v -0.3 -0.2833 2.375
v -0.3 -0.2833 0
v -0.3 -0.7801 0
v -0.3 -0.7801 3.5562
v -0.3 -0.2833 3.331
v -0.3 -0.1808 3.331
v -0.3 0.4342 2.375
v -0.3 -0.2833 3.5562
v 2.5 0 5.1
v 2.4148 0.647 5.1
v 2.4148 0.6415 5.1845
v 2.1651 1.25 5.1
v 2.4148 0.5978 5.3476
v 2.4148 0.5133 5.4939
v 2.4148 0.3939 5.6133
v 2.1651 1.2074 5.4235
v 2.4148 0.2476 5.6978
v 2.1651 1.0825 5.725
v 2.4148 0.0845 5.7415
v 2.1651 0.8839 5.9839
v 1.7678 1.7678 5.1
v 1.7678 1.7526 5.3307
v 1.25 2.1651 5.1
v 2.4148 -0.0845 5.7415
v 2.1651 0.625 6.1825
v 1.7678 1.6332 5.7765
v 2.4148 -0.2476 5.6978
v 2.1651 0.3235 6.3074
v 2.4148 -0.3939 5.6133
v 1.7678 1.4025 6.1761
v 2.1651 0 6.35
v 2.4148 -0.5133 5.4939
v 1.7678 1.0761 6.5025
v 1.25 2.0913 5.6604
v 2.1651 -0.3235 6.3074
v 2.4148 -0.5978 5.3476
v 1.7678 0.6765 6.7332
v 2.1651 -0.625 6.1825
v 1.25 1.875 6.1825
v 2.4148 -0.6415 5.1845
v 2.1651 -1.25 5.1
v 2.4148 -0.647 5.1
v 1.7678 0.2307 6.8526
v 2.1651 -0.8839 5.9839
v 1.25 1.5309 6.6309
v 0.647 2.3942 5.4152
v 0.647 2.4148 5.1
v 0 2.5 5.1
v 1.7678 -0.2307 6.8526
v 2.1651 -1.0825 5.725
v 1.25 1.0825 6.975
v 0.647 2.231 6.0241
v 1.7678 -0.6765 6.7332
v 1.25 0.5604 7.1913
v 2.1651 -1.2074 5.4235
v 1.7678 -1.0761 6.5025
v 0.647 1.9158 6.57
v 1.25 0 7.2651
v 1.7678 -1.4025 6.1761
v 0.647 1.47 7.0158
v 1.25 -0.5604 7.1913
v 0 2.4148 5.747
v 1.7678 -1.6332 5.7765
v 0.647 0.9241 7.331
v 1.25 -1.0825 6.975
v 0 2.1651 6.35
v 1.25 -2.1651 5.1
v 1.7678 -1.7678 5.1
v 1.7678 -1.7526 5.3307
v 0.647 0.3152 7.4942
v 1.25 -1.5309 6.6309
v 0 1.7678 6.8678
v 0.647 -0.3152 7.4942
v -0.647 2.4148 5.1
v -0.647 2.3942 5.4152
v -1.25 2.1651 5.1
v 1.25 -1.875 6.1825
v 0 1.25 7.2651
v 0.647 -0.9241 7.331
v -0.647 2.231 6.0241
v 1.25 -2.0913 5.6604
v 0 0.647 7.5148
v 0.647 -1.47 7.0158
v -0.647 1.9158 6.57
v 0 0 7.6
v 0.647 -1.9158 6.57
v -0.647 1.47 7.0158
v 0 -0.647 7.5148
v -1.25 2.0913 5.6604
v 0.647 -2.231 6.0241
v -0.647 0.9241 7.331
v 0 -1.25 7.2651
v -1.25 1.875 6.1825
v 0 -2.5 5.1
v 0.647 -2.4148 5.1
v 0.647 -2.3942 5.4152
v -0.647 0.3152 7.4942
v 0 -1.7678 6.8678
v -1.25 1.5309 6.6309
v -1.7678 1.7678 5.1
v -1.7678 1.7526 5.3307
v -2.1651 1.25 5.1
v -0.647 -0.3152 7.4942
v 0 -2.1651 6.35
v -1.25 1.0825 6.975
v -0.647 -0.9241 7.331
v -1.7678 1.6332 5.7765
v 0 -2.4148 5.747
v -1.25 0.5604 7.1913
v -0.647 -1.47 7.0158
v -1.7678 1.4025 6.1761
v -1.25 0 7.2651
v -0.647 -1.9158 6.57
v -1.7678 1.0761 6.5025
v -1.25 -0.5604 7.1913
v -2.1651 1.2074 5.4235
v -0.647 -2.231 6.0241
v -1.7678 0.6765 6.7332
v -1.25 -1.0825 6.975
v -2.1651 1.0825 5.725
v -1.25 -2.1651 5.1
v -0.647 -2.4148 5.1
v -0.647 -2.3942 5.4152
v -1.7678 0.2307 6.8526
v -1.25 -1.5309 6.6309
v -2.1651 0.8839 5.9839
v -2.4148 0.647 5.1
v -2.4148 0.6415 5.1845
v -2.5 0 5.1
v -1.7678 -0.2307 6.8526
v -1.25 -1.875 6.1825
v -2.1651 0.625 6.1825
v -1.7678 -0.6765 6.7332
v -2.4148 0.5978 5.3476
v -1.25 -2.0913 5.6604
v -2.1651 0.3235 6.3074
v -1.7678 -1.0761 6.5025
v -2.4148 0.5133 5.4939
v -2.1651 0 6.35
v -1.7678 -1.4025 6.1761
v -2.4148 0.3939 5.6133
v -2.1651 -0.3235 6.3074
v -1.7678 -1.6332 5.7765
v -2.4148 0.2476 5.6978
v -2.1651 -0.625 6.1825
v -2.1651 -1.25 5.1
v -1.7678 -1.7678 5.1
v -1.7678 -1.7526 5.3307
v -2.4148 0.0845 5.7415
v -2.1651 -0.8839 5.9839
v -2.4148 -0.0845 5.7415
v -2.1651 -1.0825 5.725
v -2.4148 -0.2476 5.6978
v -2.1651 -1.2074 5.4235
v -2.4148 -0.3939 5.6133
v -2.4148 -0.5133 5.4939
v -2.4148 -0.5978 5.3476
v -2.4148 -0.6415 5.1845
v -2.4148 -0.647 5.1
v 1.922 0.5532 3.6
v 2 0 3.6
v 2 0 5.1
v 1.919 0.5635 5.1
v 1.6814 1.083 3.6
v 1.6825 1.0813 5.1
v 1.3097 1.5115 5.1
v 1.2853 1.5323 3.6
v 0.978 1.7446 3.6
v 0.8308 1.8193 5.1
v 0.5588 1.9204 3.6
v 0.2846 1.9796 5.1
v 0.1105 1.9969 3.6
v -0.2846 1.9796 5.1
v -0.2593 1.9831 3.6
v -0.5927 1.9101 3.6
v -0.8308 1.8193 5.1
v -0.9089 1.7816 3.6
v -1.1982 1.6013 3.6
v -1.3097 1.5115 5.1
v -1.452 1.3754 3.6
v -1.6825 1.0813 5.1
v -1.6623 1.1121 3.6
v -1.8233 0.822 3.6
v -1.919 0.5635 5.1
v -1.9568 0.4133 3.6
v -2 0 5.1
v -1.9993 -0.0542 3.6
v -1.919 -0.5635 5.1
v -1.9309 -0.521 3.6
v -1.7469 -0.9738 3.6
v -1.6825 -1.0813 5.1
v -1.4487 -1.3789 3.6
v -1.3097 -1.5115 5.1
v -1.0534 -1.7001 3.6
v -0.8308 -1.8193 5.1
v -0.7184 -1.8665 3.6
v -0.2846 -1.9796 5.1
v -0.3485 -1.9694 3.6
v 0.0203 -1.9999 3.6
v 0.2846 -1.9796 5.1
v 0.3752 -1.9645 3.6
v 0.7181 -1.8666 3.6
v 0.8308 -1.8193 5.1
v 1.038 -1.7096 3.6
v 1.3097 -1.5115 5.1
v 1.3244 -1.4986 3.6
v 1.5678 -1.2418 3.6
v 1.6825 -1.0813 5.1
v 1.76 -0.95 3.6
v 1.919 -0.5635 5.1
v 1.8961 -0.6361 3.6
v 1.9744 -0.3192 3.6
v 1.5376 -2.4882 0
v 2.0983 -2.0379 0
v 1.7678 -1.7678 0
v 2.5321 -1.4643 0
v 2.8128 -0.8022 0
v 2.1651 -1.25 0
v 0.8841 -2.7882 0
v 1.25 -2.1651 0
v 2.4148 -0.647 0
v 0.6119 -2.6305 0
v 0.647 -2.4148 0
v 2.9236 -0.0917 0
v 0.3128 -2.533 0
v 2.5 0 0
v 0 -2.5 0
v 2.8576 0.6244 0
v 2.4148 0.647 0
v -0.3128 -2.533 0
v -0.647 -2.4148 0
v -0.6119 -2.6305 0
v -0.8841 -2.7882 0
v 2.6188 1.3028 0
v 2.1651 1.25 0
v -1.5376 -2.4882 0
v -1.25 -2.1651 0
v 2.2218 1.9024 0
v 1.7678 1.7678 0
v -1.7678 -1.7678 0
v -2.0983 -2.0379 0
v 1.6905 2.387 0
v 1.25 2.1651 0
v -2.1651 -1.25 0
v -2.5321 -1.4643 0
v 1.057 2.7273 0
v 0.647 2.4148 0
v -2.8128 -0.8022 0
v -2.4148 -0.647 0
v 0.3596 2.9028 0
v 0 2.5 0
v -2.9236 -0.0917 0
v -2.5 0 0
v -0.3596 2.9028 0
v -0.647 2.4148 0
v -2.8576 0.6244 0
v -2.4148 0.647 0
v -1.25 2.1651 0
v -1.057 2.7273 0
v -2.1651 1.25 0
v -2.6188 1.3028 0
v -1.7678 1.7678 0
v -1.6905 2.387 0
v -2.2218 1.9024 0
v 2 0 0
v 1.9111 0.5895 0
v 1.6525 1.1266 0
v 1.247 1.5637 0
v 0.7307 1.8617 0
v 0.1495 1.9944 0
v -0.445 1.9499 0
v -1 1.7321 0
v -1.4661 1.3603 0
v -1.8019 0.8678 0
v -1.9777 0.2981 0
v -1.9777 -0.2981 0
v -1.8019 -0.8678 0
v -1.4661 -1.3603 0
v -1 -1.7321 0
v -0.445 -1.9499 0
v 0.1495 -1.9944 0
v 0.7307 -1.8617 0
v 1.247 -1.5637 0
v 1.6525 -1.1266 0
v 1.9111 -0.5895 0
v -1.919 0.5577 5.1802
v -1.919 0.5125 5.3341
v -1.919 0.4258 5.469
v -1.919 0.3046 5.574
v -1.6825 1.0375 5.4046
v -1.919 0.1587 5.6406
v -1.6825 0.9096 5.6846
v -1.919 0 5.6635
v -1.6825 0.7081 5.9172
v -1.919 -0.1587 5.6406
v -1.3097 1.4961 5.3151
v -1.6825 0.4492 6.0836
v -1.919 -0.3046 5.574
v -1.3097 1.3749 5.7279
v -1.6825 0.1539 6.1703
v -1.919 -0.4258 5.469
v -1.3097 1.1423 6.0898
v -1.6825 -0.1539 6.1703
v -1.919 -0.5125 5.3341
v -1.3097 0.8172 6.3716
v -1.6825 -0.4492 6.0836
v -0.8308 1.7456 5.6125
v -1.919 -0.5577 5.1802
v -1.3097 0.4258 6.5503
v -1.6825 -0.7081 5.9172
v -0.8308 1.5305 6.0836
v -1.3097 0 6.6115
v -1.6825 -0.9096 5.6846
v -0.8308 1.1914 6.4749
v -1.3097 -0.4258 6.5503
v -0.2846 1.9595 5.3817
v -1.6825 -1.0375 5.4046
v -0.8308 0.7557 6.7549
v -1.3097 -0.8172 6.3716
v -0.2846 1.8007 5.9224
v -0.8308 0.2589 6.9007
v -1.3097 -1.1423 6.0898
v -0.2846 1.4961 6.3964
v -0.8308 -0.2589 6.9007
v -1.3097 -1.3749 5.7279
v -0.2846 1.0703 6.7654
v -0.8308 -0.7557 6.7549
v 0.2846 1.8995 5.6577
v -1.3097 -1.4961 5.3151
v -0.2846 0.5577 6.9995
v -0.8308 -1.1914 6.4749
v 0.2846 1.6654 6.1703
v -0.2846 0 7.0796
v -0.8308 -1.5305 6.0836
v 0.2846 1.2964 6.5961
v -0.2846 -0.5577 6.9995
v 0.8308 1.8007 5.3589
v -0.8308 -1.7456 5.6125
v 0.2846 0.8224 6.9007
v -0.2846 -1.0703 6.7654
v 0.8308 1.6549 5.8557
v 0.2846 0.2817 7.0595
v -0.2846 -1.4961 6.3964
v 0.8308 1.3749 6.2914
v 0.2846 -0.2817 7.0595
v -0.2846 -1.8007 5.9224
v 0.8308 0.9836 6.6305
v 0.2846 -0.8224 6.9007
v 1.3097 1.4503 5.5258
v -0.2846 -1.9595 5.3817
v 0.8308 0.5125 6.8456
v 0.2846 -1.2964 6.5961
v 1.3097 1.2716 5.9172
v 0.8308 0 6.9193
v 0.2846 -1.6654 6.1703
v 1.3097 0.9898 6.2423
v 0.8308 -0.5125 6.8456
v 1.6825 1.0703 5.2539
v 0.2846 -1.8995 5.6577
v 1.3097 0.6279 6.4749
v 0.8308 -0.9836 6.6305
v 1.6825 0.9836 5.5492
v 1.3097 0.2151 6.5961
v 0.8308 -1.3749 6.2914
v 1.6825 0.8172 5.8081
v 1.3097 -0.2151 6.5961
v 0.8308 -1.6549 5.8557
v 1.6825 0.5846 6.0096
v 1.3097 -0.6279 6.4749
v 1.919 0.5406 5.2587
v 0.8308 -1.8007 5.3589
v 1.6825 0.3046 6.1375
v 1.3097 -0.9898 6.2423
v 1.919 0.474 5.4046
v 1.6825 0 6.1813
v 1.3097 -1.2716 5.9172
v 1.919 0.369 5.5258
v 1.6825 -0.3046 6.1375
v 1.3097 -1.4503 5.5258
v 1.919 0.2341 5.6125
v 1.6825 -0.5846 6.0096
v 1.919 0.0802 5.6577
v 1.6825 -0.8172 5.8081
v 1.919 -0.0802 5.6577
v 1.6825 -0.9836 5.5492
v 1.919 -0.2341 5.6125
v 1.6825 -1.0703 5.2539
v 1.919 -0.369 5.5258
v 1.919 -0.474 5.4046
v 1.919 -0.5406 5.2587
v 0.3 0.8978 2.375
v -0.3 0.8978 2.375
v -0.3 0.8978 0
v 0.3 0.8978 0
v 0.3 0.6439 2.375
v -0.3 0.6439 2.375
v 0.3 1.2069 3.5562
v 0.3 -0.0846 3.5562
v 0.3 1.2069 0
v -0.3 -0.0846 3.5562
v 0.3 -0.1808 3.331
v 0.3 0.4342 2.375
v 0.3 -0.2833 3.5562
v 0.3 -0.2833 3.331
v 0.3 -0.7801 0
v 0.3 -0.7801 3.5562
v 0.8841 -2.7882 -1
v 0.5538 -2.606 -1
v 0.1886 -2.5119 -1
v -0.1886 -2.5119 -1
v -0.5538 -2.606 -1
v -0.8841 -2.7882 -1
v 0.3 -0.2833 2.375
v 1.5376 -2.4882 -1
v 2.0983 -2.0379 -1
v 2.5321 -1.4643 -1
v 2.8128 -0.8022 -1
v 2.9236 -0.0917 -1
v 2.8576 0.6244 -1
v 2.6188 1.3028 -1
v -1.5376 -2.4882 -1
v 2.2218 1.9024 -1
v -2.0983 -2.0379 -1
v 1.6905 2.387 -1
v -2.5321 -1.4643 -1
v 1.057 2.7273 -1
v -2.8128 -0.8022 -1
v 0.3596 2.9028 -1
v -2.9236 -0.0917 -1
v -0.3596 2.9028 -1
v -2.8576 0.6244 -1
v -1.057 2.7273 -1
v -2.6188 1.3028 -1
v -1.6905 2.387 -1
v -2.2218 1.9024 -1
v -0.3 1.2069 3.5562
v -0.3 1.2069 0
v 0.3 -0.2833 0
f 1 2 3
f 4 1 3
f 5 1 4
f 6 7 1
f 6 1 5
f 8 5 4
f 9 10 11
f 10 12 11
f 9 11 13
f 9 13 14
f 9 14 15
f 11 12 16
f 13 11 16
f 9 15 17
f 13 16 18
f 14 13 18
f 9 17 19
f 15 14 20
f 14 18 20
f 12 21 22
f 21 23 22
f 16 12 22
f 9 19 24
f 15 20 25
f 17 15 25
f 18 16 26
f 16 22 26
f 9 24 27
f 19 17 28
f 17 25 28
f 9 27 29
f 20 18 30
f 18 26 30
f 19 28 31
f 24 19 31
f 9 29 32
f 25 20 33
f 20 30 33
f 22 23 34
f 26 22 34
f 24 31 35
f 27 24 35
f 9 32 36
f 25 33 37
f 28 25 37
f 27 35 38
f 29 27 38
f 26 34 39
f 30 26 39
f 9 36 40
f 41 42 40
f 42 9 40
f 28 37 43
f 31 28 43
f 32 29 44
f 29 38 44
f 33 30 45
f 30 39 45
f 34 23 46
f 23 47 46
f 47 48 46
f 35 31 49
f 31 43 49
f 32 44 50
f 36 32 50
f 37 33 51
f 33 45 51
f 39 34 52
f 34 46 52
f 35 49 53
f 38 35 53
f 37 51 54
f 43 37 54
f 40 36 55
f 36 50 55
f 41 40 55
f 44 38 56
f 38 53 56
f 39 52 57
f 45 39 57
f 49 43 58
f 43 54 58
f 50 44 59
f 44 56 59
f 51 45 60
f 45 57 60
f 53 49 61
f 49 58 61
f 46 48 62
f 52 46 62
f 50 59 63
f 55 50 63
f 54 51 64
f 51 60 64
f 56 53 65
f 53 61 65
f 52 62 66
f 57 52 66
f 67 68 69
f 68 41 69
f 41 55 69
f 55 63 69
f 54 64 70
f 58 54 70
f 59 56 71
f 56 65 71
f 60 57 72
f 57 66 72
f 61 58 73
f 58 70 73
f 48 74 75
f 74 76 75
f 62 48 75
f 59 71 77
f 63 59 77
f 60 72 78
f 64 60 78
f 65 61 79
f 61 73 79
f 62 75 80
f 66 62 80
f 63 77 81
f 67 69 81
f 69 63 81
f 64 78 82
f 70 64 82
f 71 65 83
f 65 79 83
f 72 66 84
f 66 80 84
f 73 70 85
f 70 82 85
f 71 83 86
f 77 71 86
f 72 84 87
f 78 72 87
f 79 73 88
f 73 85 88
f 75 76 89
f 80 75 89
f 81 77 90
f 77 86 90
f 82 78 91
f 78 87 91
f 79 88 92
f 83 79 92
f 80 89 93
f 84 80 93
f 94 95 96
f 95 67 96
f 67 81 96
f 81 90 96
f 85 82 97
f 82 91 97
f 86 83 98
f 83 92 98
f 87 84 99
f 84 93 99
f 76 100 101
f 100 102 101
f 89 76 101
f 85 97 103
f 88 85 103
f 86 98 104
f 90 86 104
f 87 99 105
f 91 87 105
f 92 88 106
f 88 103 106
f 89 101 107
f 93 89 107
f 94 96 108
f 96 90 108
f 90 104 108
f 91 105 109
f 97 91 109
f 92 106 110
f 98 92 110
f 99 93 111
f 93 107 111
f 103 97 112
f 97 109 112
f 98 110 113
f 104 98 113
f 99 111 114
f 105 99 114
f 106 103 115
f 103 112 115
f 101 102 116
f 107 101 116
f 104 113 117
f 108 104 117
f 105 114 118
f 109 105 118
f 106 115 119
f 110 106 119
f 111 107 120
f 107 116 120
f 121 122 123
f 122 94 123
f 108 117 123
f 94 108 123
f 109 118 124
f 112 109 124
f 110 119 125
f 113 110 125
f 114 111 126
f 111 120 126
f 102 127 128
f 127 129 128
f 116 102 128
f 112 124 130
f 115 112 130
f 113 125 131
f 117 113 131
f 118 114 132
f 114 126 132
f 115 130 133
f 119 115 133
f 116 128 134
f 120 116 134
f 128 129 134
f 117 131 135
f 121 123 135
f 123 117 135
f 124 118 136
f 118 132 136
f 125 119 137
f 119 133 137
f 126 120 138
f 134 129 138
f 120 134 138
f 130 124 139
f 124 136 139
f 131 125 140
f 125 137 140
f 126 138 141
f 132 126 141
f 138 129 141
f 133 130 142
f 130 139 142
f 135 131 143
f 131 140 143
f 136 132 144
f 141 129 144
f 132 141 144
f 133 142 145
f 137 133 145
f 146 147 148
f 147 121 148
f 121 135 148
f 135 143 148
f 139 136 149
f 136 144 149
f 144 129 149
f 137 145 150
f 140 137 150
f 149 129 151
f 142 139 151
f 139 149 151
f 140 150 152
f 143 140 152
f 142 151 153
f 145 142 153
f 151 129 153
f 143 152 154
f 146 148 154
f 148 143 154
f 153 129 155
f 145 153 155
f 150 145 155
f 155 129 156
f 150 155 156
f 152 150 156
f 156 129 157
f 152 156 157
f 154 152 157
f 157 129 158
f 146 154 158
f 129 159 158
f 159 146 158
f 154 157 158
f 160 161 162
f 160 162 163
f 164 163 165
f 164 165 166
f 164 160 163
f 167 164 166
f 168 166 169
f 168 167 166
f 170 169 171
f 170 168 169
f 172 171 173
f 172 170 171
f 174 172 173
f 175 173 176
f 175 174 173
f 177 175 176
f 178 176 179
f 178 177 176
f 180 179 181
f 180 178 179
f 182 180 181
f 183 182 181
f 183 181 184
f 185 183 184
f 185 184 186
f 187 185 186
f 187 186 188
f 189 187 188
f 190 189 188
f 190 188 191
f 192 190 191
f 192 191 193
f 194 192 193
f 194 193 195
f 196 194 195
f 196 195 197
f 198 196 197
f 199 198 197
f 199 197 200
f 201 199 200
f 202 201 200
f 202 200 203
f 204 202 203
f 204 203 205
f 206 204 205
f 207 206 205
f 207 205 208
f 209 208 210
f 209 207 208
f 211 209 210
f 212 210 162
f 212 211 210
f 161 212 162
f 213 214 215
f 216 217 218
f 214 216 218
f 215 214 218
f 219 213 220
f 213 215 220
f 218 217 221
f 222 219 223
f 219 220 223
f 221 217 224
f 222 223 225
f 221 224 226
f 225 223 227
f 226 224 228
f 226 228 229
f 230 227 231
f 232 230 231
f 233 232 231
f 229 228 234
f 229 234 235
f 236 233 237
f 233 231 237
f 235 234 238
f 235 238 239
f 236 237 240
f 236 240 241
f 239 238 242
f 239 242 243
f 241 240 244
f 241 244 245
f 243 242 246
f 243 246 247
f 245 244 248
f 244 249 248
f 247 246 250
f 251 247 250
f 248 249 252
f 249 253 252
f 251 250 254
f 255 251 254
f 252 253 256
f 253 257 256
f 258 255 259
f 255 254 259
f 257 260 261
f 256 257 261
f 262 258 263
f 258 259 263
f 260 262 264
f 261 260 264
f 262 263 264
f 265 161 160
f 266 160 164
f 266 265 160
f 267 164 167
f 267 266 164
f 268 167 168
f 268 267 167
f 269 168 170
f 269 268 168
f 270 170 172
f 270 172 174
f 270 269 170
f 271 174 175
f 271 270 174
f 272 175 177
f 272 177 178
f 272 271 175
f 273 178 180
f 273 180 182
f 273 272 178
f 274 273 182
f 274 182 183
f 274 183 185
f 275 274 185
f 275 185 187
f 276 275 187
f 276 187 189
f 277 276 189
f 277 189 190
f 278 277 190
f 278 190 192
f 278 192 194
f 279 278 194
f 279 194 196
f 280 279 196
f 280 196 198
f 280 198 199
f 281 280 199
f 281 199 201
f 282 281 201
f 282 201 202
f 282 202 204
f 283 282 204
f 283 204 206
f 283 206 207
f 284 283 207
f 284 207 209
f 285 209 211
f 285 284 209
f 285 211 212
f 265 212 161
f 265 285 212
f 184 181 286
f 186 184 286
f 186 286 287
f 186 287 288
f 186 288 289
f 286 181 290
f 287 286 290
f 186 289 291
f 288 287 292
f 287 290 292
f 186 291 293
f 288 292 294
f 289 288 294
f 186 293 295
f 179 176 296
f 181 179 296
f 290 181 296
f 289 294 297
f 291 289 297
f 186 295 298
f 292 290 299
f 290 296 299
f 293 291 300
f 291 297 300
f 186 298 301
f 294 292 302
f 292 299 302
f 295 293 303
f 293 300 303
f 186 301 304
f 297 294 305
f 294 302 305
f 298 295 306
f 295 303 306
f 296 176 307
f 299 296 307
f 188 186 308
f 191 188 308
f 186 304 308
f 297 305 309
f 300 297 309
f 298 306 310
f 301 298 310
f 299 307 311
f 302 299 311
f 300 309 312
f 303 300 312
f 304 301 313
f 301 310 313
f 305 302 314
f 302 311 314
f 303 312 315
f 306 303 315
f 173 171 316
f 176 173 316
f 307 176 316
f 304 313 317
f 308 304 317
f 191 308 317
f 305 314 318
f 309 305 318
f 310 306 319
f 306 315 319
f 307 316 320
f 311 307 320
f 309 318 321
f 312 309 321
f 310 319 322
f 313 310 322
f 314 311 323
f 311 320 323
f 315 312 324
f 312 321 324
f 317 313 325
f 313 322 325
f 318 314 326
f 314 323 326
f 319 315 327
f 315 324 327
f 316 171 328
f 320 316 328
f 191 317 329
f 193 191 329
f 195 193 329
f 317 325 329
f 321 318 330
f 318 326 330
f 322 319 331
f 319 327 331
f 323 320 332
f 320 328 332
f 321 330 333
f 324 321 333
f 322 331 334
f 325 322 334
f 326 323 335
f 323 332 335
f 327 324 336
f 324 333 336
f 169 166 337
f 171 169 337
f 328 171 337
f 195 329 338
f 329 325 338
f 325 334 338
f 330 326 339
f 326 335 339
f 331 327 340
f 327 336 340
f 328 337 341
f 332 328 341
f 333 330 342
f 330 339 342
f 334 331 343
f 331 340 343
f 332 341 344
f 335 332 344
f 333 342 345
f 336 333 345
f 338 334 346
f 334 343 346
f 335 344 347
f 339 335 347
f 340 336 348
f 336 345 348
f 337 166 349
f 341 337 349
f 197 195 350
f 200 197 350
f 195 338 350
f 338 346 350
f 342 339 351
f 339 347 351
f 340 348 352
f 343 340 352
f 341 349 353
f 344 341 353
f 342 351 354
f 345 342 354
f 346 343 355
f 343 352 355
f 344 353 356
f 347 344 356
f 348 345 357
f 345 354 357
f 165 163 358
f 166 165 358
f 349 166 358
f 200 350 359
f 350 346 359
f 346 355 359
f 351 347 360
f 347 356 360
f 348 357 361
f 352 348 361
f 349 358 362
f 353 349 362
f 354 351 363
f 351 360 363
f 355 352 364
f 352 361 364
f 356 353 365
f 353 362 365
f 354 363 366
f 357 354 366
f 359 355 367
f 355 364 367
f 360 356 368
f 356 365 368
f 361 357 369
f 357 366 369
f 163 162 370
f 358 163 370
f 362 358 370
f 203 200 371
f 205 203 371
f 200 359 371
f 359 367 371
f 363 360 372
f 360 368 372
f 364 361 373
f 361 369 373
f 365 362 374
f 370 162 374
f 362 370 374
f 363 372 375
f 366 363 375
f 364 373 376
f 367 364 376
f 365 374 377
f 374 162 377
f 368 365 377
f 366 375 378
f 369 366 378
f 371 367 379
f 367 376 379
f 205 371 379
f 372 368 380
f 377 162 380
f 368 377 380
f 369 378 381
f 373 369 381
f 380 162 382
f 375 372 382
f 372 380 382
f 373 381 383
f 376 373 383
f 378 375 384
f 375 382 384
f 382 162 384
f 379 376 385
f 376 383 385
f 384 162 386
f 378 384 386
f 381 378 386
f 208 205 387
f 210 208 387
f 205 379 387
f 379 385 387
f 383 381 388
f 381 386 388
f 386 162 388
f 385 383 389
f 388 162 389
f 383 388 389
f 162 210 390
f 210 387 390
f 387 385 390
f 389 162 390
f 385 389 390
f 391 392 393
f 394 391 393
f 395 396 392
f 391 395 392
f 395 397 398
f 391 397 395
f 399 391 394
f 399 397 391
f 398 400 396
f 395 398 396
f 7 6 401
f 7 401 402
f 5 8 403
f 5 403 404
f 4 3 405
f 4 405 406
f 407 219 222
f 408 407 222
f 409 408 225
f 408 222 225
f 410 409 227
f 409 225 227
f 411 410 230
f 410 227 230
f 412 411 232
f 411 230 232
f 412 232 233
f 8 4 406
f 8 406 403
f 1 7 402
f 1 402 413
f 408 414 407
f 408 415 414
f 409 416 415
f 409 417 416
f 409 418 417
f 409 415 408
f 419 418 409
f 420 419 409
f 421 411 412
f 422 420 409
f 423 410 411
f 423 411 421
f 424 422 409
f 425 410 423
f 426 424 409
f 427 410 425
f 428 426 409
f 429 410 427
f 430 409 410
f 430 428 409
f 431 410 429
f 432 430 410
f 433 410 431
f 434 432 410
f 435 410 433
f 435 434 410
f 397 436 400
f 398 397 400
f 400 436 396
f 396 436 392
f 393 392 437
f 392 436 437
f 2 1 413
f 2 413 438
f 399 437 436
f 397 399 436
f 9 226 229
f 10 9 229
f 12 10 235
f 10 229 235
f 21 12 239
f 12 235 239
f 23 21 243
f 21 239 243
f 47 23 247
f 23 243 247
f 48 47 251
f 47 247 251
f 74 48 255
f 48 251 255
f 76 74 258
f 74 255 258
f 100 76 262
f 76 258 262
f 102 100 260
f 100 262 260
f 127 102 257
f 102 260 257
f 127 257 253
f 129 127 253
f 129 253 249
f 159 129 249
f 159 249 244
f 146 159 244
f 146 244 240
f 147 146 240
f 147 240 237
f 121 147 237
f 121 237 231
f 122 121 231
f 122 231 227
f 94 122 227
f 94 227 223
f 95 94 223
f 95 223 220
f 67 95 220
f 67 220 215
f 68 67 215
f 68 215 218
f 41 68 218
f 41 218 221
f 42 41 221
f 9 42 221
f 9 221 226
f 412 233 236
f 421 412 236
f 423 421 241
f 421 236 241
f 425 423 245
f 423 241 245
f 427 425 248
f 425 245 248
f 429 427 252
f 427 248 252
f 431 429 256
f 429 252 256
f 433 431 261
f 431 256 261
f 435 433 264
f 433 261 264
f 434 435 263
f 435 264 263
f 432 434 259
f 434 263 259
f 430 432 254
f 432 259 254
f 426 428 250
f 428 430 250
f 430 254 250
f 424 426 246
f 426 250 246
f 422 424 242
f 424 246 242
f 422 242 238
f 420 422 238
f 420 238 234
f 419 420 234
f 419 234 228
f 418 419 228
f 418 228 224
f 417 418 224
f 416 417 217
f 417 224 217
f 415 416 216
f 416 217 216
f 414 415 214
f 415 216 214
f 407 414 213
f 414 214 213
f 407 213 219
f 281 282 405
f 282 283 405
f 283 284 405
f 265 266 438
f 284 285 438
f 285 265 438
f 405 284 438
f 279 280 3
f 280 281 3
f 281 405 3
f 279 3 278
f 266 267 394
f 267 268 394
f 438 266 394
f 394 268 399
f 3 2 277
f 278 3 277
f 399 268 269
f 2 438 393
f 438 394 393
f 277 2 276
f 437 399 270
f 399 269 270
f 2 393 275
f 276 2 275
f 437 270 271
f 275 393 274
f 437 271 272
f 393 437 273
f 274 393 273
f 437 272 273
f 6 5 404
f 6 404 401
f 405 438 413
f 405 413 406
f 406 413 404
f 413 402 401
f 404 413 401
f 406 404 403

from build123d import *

# Parameters (mm, degrees)
SKETCH1_R                = 2.5
SKETCH1_R_2              = 2
BOSS_EXTRUDE1_DEPTH      = 5.1
SKETCH3_R                = 2.925
BOSS_EXTRUDE2_DEPTH      = 1
SKETCH4_R                = 2
CUT_EXTRUDE2_DEPTH       = 5.1
BOSS_EXTRUDE3_DEPTH      = 0.3
BOSS_EXTRUDE3_DEPTH_BACK = 0.3
SKETCH9_R                = 1.5
CUT_EXTRUDE3_DEPTH       = 3


with BuildPart() as part:
    # Sketch1 → Boss-Extrude1 (new body)
    with BuildSketch(Plane.XY):
        Circle(SKETCH1_R)
        Circle(SKETCH1_R_2, mode=Mode.SUBTRACT)
    extrude(amount=BOSS_EXTRUDE1_DEPTH)

    # Sketch2 → Revolve1 (revolve)
    with BuildSketch(Plane.XY.offset(5.1)):
        with BuildLine():
            Line((-2.5, 0), (-2, 0))
            ThreePointArc((-2, 0), (0, -2), (2, 0))
            Line((2, 0), (2.5, 0))
            ThreePointArc((2.5, 0), (0, -2.5), (-2.5, 0))
        make_face()
    revolve(axis=Axis((-3.079262147, 0, 5.1), (1, 0, 0)))

    # Sketch3 → Boss-Extrude2 (add)
    with BuildSketch(Plane(origin=(0, 0, 0), x_dir=(-1, 0, 0), z_dir=(0, 0, -1))):
        Circle(SKETCH3_R)
    extrude(amount=BOSS_EXTRUDE2_DEPTH)

    # Sketch4 → Cut-Extrude2 (cut)
    with BuildSketch(Plane.XY):
        Circle(SKETCH4_R)
    extrude(amount=CUT_EXTRUDE2_DEPTH, mode=Mode.SUBTRACT)

    # Sketch6 → Boss-Extrude3 (add, two sides: drawn at the far end of the back side and taken through both)
    with BuildSketch(Plane(origin=(0, 0, 0), x_dir=(0, 0, -1), z_dir=(1, 0, 0)).offset(-BOSS_EXTRUDE3_DEPTH_BACK)):
        Polygon((0, 1.206894491), (-3.556166294, 1.206894491), (-3.556166294, -0.084621026), (-2.37503672, 0.643926189), (-2.37503672, 0.897813854), (0, 0.897813854), align=None)
        Polygon((-3.556166294, -0.28331572), (-3.330966178, -0.28331572), (-3.330966178, -0.18084552), (-2.37503672, 0.4341929), (-2.37503672, -0.28331572), (0, -0.28331572), (0, -0.780052457), (-3.556166294, -0.780052457), align=None)
    extrude(amount=BOSS_EXTRUDE3_DEPTH + BOSS_EXTRUDE3_DEPTH_BACK)

    # Sketch9 → Cut-Extrude3 (cut)
    with BuildSketch(Plane.XY):
        with Locations((0, -4)):
            Circle(SKETCH9_R)
    extrude(amount=-CUT_EXTRUDE3_DEPTH, mode=Mode.SUBTRACT)


solid = part.part
